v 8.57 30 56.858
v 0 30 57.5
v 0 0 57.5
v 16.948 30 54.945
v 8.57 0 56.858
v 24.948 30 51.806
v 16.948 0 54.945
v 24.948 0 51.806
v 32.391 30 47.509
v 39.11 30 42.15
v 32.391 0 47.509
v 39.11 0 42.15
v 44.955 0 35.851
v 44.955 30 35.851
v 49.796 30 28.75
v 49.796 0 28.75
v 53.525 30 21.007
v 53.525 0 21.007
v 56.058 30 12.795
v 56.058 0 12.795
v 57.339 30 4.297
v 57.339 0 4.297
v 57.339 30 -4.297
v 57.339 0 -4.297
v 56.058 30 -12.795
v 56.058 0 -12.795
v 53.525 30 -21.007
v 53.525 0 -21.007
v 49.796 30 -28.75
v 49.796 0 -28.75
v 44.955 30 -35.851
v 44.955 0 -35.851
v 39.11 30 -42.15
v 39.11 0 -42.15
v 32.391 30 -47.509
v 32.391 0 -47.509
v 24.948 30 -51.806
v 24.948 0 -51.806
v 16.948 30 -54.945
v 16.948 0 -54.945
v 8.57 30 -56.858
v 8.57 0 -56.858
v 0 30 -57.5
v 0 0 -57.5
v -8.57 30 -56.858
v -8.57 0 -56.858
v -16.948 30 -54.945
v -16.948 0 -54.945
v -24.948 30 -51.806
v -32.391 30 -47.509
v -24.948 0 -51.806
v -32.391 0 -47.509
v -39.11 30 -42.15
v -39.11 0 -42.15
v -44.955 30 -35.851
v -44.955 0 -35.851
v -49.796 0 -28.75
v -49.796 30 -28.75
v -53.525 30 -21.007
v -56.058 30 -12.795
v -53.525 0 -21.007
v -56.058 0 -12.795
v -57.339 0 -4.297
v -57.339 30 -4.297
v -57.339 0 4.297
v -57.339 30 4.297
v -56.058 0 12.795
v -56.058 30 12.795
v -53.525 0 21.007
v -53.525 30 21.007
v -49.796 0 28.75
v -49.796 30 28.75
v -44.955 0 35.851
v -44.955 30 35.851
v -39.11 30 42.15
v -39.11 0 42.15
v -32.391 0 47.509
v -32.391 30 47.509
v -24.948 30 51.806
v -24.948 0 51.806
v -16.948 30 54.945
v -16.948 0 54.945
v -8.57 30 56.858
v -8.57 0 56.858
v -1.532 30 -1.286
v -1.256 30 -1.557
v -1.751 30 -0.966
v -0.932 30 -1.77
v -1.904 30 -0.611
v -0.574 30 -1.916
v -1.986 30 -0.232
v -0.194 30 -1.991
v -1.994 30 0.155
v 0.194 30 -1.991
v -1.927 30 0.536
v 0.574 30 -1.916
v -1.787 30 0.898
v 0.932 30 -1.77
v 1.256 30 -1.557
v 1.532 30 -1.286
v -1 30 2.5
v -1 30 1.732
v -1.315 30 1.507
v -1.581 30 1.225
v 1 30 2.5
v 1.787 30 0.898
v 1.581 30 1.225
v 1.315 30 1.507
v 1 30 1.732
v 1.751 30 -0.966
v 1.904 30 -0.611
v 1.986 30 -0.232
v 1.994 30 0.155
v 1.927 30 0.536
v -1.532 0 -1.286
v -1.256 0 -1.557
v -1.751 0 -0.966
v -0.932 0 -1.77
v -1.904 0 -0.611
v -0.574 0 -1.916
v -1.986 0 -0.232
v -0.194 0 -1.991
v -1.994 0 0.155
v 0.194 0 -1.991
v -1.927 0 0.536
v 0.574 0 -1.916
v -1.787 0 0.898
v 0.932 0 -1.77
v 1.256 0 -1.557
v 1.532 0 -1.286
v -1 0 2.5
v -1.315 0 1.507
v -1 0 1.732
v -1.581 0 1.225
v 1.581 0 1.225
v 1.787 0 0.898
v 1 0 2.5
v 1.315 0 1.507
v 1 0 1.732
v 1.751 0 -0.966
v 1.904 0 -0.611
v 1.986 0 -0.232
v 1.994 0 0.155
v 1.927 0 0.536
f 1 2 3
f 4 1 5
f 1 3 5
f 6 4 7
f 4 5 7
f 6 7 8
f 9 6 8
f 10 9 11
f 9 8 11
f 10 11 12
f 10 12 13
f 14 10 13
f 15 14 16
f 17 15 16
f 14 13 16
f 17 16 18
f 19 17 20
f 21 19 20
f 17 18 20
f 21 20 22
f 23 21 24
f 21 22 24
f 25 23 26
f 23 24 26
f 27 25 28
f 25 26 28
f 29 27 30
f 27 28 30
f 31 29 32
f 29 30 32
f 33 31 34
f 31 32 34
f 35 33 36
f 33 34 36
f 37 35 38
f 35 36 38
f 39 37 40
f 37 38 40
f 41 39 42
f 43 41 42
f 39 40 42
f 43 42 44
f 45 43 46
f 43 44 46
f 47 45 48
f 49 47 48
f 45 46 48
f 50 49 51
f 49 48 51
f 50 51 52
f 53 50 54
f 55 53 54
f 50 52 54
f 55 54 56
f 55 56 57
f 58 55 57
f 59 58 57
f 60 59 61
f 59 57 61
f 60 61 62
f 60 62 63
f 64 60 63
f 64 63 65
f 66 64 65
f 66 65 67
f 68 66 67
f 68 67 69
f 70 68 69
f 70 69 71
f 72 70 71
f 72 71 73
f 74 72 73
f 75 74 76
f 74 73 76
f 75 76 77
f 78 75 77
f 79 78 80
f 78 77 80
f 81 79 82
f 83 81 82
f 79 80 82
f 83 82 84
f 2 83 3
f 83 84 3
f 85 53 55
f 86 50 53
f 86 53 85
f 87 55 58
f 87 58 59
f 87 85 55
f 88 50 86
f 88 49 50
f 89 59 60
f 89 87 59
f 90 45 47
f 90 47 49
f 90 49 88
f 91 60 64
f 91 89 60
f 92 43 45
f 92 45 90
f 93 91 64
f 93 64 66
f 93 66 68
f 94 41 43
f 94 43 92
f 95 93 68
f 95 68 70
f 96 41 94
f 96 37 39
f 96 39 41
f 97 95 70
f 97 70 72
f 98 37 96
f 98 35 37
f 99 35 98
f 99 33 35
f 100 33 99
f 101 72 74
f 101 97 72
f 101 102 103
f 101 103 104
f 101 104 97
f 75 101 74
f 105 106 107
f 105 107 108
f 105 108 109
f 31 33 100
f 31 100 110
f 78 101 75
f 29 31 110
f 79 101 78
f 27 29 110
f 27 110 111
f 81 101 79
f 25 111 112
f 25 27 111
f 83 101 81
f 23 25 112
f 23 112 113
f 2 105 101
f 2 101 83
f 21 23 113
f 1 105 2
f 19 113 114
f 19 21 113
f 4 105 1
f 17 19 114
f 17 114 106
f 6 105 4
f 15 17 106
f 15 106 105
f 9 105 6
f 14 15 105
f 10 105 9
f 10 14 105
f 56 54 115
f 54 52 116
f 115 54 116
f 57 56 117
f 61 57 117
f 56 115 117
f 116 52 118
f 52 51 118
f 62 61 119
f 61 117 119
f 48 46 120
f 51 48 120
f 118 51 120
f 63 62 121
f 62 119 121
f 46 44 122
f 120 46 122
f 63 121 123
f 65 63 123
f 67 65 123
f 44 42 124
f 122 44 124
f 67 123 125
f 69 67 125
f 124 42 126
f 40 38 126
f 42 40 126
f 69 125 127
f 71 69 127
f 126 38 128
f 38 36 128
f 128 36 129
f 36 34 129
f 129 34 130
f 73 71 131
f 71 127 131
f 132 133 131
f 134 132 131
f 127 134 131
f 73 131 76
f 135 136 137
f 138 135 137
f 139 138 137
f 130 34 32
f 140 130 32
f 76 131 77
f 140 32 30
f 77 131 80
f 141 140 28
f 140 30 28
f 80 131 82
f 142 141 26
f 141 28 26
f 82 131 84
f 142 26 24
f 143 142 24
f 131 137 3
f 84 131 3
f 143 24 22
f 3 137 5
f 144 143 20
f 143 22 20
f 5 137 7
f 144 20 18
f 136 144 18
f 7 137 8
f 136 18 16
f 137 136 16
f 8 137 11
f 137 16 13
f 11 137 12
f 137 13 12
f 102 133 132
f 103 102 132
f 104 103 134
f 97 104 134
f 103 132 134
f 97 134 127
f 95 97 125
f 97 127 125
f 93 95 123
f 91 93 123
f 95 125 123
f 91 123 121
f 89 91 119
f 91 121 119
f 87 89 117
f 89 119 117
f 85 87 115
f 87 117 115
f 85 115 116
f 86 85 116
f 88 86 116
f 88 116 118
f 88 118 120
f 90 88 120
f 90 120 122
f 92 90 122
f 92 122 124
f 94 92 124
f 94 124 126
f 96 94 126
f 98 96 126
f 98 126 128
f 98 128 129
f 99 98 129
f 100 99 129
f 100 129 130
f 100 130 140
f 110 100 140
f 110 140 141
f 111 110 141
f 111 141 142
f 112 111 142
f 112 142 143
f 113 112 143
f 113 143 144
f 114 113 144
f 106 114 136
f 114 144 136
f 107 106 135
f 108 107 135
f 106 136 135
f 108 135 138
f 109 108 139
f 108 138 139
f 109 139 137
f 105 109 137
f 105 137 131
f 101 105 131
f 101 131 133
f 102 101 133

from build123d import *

# Parameters (mm, degrees)
SKETCH1_R           = 57.5
BOSS_EXTRUDE1_DEPTH = 30
CUT_EXTRUDE1_DEPTH  = 87.674679117


with BuildPart() as part:
    # Sketch1 → Boss-Extrude1 (new body)
    with BuildSketch(Plane(origin=(0, 0, 0), x_dir=(1, 0, 0), z_dir=(0, 1, 0))):
        with Locations(Location((0, 0, 0), (0, 0, 270))):
            Circle(SKETCH1_R)
    extrude(amount=BOSS_EXTRUDE1_DEPTH)

    # Sketch2 → Cut-Extrude1 (cut, through all)
    with BuildSketch(Plane.XZ):
        with BuildLine():
            Line((1, 1.732050808), (1, 2.5))
            Line((1, 2.5), (-1, 2.5))
            Line((-1, 2.5), (-1, 1.732050808))
            ThreePointArc((-1, 1.732050808), (0, -2), (1, 1.732050808))
        make_face()
    extrude(amount=-CUT_EXTRUDE1_DEPTH, mode=Mode.SUBTRACT)


solid = part.part
